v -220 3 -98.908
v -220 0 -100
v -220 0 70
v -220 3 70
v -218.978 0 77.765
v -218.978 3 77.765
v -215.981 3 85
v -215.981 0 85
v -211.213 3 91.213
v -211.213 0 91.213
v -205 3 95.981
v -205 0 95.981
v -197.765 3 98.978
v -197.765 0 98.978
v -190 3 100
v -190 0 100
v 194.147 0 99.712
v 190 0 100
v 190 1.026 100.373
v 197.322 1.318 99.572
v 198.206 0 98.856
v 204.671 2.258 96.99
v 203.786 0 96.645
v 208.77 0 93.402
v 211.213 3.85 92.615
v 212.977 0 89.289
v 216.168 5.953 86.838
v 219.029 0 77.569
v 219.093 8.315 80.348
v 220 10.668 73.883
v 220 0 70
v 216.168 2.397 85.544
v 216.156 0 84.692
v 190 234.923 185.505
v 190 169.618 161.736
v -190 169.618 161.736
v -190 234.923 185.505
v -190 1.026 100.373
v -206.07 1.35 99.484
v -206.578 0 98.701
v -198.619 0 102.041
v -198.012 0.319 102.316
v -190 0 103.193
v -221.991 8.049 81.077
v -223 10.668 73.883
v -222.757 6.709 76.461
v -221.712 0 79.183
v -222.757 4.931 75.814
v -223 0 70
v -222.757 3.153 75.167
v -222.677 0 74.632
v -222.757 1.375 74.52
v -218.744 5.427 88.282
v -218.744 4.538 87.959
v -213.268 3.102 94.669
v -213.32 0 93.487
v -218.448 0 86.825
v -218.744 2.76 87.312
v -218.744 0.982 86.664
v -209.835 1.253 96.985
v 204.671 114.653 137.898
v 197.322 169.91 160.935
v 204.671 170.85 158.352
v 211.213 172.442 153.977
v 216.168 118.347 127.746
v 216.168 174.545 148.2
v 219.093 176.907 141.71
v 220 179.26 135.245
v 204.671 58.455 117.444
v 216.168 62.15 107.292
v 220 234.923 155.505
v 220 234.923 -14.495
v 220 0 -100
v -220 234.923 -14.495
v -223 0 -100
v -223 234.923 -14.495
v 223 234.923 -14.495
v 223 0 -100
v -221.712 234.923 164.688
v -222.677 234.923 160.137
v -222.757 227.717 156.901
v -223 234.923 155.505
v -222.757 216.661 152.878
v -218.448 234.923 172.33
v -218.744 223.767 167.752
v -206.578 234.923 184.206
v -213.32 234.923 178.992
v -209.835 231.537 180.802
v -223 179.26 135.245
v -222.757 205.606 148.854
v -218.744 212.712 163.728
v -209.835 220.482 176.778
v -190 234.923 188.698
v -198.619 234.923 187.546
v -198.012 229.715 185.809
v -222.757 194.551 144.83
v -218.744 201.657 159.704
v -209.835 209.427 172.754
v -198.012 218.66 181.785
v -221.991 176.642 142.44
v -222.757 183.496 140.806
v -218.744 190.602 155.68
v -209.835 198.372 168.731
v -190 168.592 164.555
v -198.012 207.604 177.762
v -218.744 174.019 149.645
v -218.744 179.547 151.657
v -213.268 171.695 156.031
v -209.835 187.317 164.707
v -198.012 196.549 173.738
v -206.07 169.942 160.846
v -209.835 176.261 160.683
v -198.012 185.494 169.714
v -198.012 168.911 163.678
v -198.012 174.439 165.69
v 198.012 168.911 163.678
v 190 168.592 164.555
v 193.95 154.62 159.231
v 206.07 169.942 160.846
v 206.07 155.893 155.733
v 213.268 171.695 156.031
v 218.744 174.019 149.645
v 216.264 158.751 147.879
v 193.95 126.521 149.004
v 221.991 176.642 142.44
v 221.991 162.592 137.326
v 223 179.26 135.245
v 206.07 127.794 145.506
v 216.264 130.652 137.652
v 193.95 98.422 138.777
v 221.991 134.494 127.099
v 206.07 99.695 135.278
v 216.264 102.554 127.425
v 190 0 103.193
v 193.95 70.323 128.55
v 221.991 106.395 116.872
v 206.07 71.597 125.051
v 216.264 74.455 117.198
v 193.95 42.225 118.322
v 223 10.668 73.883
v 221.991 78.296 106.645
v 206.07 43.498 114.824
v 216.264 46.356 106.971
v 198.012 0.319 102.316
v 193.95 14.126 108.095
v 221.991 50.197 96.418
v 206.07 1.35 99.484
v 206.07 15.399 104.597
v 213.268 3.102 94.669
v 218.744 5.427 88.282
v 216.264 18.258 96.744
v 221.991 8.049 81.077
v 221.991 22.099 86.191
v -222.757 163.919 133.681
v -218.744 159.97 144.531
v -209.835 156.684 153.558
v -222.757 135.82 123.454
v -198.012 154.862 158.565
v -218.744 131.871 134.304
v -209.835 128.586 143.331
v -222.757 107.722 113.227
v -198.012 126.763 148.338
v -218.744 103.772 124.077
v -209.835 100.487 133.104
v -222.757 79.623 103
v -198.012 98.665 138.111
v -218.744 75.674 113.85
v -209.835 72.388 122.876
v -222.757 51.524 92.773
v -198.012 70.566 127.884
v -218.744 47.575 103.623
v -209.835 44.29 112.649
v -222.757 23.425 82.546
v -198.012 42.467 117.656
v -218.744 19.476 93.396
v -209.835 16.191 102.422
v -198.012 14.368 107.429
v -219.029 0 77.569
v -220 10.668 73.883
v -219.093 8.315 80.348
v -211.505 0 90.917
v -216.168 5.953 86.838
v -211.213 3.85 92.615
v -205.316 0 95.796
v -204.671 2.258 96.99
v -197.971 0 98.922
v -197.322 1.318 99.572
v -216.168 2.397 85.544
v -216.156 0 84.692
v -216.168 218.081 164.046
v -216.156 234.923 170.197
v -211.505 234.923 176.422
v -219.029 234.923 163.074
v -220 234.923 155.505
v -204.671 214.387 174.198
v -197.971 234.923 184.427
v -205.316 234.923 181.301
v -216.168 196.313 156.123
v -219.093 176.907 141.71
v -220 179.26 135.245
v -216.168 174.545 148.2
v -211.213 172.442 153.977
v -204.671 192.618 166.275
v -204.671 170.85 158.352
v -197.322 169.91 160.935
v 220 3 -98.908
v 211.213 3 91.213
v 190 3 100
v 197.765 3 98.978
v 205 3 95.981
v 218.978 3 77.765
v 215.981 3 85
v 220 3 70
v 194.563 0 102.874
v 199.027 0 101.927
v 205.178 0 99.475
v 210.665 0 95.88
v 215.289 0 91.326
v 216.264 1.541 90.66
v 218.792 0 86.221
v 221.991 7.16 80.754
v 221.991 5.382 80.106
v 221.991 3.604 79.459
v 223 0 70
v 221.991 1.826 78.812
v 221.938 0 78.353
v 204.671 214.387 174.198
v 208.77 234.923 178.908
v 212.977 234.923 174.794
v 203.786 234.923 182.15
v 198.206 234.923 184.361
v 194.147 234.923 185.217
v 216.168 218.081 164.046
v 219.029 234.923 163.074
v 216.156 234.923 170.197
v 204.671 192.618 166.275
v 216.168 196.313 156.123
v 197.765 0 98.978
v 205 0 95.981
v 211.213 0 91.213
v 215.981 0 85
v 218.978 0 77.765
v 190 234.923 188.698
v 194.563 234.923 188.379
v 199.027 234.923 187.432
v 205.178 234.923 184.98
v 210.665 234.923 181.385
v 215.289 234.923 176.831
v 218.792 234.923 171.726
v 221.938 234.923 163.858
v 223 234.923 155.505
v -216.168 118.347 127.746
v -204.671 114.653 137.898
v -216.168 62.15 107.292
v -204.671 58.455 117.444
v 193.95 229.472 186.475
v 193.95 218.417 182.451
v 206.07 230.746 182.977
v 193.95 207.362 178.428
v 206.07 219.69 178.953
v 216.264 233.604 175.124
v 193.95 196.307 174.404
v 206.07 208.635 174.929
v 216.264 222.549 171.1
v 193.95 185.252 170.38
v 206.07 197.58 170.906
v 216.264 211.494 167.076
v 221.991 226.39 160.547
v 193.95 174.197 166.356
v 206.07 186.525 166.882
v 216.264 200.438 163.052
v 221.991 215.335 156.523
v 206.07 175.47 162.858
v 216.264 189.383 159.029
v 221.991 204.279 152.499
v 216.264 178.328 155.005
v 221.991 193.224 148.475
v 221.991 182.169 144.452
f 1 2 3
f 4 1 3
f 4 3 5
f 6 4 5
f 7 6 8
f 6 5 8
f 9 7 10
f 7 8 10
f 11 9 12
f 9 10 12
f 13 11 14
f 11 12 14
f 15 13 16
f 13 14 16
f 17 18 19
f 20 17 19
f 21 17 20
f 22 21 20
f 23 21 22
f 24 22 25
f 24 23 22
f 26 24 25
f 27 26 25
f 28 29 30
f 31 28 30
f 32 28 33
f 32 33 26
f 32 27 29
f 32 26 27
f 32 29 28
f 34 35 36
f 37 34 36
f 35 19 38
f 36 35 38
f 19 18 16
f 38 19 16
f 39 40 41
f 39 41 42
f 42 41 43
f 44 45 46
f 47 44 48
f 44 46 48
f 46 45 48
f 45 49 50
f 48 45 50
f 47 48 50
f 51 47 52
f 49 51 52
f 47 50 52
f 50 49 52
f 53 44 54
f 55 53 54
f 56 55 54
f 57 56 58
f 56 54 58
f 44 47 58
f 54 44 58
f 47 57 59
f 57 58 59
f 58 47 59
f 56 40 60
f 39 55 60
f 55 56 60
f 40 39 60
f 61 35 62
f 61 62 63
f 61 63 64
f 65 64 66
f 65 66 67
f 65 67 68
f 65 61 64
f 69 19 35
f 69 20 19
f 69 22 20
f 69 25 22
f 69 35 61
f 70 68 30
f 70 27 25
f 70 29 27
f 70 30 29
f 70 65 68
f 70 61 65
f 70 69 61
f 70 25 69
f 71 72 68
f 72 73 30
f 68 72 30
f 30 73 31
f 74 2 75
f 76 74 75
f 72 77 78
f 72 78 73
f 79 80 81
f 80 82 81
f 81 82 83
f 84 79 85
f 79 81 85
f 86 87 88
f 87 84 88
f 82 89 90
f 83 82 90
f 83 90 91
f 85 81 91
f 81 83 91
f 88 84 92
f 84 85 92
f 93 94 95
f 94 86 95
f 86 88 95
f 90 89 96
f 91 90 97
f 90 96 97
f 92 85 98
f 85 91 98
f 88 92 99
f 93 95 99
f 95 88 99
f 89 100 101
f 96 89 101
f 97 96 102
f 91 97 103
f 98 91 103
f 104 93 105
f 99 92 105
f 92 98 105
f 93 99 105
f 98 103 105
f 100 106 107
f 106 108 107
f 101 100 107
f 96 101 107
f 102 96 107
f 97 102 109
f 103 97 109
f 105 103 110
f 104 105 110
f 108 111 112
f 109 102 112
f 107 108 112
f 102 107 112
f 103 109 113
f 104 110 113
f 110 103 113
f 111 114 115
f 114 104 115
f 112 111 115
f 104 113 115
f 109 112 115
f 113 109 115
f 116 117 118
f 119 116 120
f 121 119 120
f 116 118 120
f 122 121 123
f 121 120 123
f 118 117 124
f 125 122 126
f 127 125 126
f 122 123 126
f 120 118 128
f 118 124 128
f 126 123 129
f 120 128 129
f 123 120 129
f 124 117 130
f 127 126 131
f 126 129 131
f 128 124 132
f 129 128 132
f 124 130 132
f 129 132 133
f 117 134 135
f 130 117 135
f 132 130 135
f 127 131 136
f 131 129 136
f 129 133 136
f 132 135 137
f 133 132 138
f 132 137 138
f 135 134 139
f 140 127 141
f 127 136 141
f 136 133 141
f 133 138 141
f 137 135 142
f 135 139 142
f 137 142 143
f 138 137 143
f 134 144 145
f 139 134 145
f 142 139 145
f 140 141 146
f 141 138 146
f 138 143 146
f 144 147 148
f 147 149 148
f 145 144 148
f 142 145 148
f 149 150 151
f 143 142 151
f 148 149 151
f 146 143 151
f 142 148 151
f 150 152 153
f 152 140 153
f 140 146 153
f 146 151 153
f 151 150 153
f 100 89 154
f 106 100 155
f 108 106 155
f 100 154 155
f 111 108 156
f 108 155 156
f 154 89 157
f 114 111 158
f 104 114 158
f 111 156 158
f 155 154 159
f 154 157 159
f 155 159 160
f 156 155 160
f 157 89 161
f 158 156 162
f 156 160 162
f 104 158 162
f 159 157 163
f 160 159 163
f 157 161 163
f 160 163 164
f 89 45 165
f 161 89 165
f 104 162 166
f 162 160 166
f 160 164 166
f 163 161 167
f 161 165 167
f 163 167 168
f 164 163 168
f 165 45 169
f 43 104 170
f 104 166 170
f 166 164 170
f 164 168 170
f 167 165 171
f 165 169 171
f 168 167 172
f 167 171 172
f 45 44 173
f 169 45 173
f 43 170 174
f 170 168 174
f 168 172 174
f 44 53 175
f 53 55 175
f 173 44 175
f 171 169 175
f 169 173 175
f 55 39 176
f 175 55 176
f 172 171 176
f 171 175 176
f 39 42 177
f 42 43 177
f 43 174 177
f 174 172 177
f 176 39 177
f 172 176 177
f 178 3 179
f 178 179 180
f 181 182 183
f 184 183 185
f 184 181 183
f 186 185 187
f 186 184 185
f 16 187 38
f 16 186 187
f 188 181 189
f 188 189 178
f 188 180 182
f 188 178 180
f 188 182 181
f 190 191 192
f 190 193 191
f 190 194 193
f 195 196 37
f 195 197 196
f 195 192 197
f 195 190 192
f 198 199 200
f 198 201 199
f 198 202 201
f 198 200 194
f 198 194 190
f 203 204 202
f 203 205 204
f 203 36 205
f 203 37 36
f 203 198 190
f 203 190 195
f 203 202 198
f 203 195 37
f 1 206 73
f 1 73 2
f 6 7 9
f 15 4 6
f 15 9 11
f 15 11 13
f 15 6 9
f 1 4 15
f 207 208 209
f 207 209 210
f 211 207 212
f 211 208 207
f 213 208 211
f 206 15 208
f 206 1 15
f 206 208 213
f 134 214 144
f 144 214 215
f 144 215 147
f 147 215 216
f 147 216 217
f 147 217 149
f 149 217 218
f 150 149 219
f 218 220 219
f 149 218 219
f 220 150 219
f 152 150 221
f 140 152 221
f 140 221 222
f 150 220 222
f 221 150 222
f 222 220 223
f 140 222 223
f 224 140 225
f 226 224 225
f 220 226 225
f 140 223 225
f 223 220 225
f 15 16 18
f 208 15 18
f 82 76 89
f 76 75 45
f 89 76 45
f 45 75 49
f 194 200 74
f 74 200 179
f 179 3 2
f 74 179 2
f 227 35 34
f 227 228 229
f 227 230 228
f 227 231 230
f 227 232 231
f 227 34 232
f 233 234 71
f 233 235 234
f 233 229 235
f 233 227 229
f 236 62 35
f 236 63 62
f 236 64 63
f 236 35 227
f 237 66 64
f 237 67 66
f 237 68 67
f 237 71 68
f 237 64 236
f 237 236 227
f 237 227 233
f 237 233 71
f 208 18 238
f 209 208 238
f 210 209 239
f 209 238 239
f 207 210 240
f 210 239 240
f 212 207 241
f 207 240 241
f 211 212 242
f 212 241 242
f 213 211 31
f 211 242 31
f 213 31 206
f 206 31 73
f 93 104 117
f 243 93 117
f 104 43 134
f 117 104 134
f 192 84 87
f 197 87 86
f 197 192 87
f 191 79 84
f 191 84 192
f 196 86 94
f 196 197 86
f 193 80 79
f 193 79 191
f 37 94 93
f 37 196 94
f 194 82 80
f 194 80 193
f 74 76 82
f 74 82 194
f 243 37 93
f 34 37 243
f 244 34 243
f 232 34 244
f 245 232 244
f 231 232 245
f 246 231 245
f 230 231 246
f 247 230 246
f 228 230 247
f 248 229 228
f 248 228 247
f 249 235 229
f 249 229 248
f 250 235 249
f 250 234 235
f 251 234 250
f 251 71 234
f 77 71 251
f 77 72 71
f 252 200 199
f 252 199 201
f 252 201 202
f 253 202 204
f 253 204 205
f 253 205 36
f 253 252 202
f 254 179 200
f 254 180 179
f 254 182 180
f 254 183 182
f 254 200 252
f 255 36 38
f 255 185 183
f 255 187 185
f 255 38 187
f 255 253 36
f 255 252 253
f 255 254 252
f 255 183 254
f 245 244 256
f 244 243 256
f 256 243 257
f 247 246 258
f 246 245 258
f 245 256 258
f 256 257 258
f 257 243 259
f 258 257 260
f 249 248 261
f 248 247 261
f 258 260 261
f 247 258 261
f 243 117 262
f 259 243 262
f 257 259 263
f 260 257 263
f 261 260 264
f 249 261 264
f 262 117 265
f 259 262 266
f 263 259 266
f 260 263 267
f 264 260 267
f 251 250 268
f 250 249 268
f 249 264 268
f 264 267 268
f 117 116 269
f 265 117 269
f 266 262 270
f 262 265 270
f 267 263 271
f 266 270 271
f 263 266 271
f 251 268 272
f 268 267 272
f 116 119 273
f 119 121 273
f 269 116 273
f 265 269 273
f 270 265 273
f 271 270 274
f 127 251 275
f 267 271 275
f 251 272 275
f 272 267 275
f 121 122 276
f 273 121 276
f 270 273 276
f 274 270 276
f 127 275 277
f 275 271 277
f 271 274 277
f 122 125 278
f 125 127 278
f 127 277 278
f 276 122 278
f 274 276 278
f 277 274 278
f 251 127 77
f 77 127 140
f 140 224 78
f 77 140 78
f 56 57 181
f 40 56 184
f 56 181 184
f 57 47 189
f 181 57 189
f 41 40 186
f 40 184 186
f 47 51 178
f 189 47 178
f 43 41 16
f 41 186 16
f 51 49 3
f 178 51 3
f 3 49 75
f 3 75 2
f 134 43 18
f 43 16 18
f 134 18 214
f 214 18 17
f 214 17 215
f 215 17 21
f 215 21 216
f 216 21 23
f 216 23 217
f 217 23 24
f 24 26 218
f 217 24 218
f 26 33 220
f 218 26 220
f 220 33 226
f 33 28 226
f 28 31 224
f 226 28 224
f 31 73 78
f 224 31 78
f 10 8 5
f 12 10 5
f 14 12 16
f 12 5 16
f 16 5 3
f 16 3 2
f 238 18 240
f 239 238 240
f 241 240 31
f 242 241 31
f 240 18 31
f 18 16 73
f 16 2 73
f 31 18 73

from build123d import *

# Parameters (mm, degrees)
SWEEP_THIN1_START       = 35.293924935
SWEEP_THIN1_DEPTH       = 179.41214993
SWEEP_THIN1_START_2     = -35.293925135
SWEEP_THIN1_2_DEPTH     = 320.587850271
SWEEP_THIN1_START_3     = -67
SWEEP_THIN1_3_OUTLINE_W = 446
SWEEP_THIN1_3_OUTLINE_H = 295
SWEEP_THIN1_3_DEPTH     = 67
SWEEP_THIN1_START_4     = 234.923155196
SWEEP_THIN1_4_OUTLINE_W = 446
SWEEP_THIN1_4_OUTLINE_H = 295
SWEEP_THIN1_4_DEPTH     = 66.330881924
BOSS_EXTRUDE2_DEPTH     = 3
SKETCH6_W               = 723.00386444
SKETCH6_H               = 605.053805232
CUT_EXTRUDE1_DEPTH      = 3


with BuildPart() as part:
    # Sweep-Thin1: read off the stored shape, not the designer's step
    # Sweep-Thin1 outline → Sweep-Thin1 (new body)
    with BuildSketch(Plane(origin=(0, 0, 0), x_dir=(1, 0, 0), z_dir=(0, 0.9396926207859089, 0.3420201433256672)).offset(SWEEP_THIN1_START)):
        with BuildLine():
            Line((223, -65.778483455), (223, 96.969262079))
            Line((223, 96.969262079), (-223, 96.969262079))
            Line((-223, 96.969262079), (-223, -65.778483455))
            add(Edge.make_bspline(
                [(-223, -65.778483455), (-223, -69.477042237), (-222.493972968, -73.37256542), (-221.393047263, -77.378729206), (-219.625765413, -81.371277703), (-217.160966169, -85.187590547), (-214.030117008, -88.644891061), (-210.35485162, -91.564481232), (-206.328004584, -93.851338413), (-202.135894004, -95.485342048), (-197.941508955, -96.501990369), (-193.867765418, -96.969262079), (-190, -96.969262079)],
                knots=[0, 0, 0, 0, 0, 0, 0, 0, 0, 0, 0, 0, 0, 1, 1, 1, 1, 1, 1, 1, 1, 1, 1, 1, 1, 1], degree=12))
            Line((-190, -96.969262079), (190, -96.969262079))
            add(Edge.make_bspline(
                [(190, -96.969262079), (193.867765418, -96.969262079), (197.941508955, -96.501990369), (202.135894005, -95.485342048), (206.328004584, -93.851338413), (210.35485162, -91.564481232), (214.030117008, -88.644891061), (217.16096617, -85.187590547), (219.625765413, -81.371277703), (221.393047263, -77.378729206), (222.493972968, -73.37256542), (223, -69.477042237), (223, -65.778483455)],
                knots=[0, 0, 0, 0, 0, 0, 0, 0, 0, 0, 0, 0, 0, 1, 1, 1, 1, 1, 1, 1, 1, 1, 1, 1, 1, 1], degree=12))
        make_face()
        with BuildLine():
            Line((-220, 93.969262079), (220, 93.969262079))
            Line((220, 93.969262079), (220, -65.778483455))
            add(Edge.make_bspline(
                [(190, -93.969262079), (207.573593129, -93.969262079), (220, -82.292259239), (220, -65.778483455)],
                knots=[0, 0, 0, 0, 1, 1, 1, 1], degree=3, weights=[1, 0.804737854, 0.804737854, 1]))
            Line((190, -93.969262079), (-190, -93.969262079))
            add(Edge.make_bspline(
                [(-220, -65.778483455), (-220, -82.292259239), (-207.573593129, -93.969262079), (-190, -93.969262079)],
                knots=[0, 0, 0, 0, 1, 1, 1, 1], degree=3, weights=[1, 0.804737854, 0.804737854, 1]))
            Line((-220, -65.778483455), (-220, 93.969262079))
        make_face(mode=Mode.SUBTRACT)
    extrude(amount=SWEEP_THIN1_DEPTH)

    # Sweep-Thin1 2 outline → Sweep-Thin1 2 (add)
    with BuildSketch(Plane(origin=(0, 0, 0), x_dir=(1, 0, 0), z_dir=(0, 0.9396926207859089, 0.3420201433256672)).offset(SWEEP_THIN1_START_2)):
        with BuildLine():
            Line((-223, 96.969262079), (-223, -65.778483455))
            add(Edge.make_bspline(
                [(-223, -65.778483455), (-223, -69.477042237), (-222.493972968, -73.37256542), (-221.393047263, -77.378729206), (-219.625765413, -81.371277703), (-217.160966169, -85.187590547), (-214.030117008, -88.644891061), (-210.35485162, -91.564481232), (-206.328004584, -93.851338413), (-202.135894004, -95.485342048), (-197.941508955, -96.501990369), (-193.867765418, -96.969262079), (-190, -96.969262079)],
                knots=[0, 0, 0, 0, 0, 0, 0, 0, 0, 0, 0, 0, 0, 1, 1, 1, 1, 1, 1, 1, 1, 1, 1, 1, 1, 1], degree=12))
            Line((-190, -96.969262079), (190, -96.969262079))
            add(Edge.make_bspline(
                [(190, -96.969262079), (193.867765418, -96.969262079), (197.941508955, -96.501990369), (202.135894005, -95.485342048), (206.328004584, -93.851338413), (210.35485162, -91.564481232), (214.030117008, -88.644891061), (217.16096617, -85.187590547), (219.625765413, -81.371277703), (221.393047263, -77.378729206), (222.493972968, -73.37256542), (223, -69.477042237), (223, -65.778483455)],
                knots=[0, 0, 0, 0, 0, 0, 0, 0, 0, 0, 0, 0, 0, 1, 1, 1, 1, 1, 1, 1, 1, 1, 1, 1, 1, 1], degree=12))
            Line((223, -65.778483455), (223, 96.969262079))
            Line((223, 96.969262079), (-223, 96.969262079))
        make_face()
        with BuildLine():
            add(Edge.make_bspline(
                [(-220, -65.778483455), (-220, -82.292259239), (-207.573593129, -93.969262079), (-190, -93.969262079)],
                knots=[0, 0, 0, 0, 1, 1, 1, 1], degree=3, weights=[1, 0.804737854, 0.804737854, 1]))
            Line((-220, -65.778483455), (-220, 93.969262079))
            Line((-220, 93.969262079), (220, 93.969262079))
            Line((220, 93.969262079), (220, -65.778483455))
            add(Edge.make_bspline(
                [(190, -93.969262079), (207.573593129, -93.969262079), (220, -82.292259239), (220, -65.778483455)],
                knots=[0, 0, 0, 0, 1, 1, 1, 1], degree=3, weights=[1, 0.804737854, 0.804737854, 1]))
            Line((190, -93.969262079), (-190, -93.969262079))
        make_face(mode=Mode.SUBTRACT)
    extrude(amount=SWEEP_THIN1_2_DEPTH)

    # Sweep-Thin1 3 outline → Sweep-Thin1 3 (cut)
    with BuildSketch(Plane(origin=(0, 0, 0), x_dir=(1, 0, 0), z_dir=(0, 1, 0)).offset(SWEEP_THIN1_START_3)):
        with Locations((0, -42.5)):
            Rectangle(SWEEP_THIN1_3_OUTLINE_W, SWEEP_THIN1_3_OUTLINE_H)
    extrude(amount=SWEEP_THIN1_3_DEPTH, mode=Mode.SUBTRACT)

    # Sweep-Thin1 4 outline → Sweep-Thin1 4 (cut)
    with BuildSketch(Plane(origin=(0, 0, 0), x_dir=(1, 0, 0), z_dir=(0, 1, 0)).offset(SWEEP_THIN1_START_4)):
        with Locations((0, -42.5)):
            Rectangle(SWEEP_THIN1_4_OUTLINE_W, SWEEP_THIN1_4_OUTLINE_H)
    extrude(amount=SWEEP_THIN1_4_DEPTH, mode=Mode.SUBTRACT)


with BuildPart() as body_2:
    # Sketch5 → Boss-Extrude2 (new body)
    with BuildSketch(Plane(origin=(0, 0, 0), x_dir=(1, 0, 0), z_dir=(0, 1, 0))):
        with BuildLine():
            Line((-190, -100), (190, -100))
            ThreePointArc((190, -100), (211.213203436, -91.213203436), (220, -70))
            Line((220, -70), (220, 100))
            Line((220, 100), (-220, 100))
            Line((-220, 100), (-220, -70))
            ThreePointArc((-220, -70), (-211.213203436, -91.213203436), (-190, -100))
        make_face()
    extrude(amount=BOSS_EXTRUDE2_DEPTH)


with BuildPart() as cut_extrude1_tool:
    # Sketch6 → Cut-Extrude1 (new body)
    with BuildSketch(Plane(origin=(0, 33.165440914, -91.121300018), x_dir=(-1, 0, 0), z_dir=(0, 0.34202014332566627, -0.9396926207859093))):
        Rectangle(SKETCH6_W, SKETCH6_H)
    extrude(amount=-CUT_EXTRUDE1_DEPTH)


with BuildPart() as part_1:
    add(part.part)

    # Cut-Extrude1: cut by cut_extrude1_tool
    add(cut_extrude1_tool.part, mode=Mode.SUBTRACT)


with BuildPart() as body_2_1:
    add(body_2.part)

    # Cut-Extrude1: cut by cut_extrude1_tool
    add(cut_extrude1_tool.part, mode=Mode.SUBTRACT)


solid = Compound([part_1.part, body_2_1.part])
